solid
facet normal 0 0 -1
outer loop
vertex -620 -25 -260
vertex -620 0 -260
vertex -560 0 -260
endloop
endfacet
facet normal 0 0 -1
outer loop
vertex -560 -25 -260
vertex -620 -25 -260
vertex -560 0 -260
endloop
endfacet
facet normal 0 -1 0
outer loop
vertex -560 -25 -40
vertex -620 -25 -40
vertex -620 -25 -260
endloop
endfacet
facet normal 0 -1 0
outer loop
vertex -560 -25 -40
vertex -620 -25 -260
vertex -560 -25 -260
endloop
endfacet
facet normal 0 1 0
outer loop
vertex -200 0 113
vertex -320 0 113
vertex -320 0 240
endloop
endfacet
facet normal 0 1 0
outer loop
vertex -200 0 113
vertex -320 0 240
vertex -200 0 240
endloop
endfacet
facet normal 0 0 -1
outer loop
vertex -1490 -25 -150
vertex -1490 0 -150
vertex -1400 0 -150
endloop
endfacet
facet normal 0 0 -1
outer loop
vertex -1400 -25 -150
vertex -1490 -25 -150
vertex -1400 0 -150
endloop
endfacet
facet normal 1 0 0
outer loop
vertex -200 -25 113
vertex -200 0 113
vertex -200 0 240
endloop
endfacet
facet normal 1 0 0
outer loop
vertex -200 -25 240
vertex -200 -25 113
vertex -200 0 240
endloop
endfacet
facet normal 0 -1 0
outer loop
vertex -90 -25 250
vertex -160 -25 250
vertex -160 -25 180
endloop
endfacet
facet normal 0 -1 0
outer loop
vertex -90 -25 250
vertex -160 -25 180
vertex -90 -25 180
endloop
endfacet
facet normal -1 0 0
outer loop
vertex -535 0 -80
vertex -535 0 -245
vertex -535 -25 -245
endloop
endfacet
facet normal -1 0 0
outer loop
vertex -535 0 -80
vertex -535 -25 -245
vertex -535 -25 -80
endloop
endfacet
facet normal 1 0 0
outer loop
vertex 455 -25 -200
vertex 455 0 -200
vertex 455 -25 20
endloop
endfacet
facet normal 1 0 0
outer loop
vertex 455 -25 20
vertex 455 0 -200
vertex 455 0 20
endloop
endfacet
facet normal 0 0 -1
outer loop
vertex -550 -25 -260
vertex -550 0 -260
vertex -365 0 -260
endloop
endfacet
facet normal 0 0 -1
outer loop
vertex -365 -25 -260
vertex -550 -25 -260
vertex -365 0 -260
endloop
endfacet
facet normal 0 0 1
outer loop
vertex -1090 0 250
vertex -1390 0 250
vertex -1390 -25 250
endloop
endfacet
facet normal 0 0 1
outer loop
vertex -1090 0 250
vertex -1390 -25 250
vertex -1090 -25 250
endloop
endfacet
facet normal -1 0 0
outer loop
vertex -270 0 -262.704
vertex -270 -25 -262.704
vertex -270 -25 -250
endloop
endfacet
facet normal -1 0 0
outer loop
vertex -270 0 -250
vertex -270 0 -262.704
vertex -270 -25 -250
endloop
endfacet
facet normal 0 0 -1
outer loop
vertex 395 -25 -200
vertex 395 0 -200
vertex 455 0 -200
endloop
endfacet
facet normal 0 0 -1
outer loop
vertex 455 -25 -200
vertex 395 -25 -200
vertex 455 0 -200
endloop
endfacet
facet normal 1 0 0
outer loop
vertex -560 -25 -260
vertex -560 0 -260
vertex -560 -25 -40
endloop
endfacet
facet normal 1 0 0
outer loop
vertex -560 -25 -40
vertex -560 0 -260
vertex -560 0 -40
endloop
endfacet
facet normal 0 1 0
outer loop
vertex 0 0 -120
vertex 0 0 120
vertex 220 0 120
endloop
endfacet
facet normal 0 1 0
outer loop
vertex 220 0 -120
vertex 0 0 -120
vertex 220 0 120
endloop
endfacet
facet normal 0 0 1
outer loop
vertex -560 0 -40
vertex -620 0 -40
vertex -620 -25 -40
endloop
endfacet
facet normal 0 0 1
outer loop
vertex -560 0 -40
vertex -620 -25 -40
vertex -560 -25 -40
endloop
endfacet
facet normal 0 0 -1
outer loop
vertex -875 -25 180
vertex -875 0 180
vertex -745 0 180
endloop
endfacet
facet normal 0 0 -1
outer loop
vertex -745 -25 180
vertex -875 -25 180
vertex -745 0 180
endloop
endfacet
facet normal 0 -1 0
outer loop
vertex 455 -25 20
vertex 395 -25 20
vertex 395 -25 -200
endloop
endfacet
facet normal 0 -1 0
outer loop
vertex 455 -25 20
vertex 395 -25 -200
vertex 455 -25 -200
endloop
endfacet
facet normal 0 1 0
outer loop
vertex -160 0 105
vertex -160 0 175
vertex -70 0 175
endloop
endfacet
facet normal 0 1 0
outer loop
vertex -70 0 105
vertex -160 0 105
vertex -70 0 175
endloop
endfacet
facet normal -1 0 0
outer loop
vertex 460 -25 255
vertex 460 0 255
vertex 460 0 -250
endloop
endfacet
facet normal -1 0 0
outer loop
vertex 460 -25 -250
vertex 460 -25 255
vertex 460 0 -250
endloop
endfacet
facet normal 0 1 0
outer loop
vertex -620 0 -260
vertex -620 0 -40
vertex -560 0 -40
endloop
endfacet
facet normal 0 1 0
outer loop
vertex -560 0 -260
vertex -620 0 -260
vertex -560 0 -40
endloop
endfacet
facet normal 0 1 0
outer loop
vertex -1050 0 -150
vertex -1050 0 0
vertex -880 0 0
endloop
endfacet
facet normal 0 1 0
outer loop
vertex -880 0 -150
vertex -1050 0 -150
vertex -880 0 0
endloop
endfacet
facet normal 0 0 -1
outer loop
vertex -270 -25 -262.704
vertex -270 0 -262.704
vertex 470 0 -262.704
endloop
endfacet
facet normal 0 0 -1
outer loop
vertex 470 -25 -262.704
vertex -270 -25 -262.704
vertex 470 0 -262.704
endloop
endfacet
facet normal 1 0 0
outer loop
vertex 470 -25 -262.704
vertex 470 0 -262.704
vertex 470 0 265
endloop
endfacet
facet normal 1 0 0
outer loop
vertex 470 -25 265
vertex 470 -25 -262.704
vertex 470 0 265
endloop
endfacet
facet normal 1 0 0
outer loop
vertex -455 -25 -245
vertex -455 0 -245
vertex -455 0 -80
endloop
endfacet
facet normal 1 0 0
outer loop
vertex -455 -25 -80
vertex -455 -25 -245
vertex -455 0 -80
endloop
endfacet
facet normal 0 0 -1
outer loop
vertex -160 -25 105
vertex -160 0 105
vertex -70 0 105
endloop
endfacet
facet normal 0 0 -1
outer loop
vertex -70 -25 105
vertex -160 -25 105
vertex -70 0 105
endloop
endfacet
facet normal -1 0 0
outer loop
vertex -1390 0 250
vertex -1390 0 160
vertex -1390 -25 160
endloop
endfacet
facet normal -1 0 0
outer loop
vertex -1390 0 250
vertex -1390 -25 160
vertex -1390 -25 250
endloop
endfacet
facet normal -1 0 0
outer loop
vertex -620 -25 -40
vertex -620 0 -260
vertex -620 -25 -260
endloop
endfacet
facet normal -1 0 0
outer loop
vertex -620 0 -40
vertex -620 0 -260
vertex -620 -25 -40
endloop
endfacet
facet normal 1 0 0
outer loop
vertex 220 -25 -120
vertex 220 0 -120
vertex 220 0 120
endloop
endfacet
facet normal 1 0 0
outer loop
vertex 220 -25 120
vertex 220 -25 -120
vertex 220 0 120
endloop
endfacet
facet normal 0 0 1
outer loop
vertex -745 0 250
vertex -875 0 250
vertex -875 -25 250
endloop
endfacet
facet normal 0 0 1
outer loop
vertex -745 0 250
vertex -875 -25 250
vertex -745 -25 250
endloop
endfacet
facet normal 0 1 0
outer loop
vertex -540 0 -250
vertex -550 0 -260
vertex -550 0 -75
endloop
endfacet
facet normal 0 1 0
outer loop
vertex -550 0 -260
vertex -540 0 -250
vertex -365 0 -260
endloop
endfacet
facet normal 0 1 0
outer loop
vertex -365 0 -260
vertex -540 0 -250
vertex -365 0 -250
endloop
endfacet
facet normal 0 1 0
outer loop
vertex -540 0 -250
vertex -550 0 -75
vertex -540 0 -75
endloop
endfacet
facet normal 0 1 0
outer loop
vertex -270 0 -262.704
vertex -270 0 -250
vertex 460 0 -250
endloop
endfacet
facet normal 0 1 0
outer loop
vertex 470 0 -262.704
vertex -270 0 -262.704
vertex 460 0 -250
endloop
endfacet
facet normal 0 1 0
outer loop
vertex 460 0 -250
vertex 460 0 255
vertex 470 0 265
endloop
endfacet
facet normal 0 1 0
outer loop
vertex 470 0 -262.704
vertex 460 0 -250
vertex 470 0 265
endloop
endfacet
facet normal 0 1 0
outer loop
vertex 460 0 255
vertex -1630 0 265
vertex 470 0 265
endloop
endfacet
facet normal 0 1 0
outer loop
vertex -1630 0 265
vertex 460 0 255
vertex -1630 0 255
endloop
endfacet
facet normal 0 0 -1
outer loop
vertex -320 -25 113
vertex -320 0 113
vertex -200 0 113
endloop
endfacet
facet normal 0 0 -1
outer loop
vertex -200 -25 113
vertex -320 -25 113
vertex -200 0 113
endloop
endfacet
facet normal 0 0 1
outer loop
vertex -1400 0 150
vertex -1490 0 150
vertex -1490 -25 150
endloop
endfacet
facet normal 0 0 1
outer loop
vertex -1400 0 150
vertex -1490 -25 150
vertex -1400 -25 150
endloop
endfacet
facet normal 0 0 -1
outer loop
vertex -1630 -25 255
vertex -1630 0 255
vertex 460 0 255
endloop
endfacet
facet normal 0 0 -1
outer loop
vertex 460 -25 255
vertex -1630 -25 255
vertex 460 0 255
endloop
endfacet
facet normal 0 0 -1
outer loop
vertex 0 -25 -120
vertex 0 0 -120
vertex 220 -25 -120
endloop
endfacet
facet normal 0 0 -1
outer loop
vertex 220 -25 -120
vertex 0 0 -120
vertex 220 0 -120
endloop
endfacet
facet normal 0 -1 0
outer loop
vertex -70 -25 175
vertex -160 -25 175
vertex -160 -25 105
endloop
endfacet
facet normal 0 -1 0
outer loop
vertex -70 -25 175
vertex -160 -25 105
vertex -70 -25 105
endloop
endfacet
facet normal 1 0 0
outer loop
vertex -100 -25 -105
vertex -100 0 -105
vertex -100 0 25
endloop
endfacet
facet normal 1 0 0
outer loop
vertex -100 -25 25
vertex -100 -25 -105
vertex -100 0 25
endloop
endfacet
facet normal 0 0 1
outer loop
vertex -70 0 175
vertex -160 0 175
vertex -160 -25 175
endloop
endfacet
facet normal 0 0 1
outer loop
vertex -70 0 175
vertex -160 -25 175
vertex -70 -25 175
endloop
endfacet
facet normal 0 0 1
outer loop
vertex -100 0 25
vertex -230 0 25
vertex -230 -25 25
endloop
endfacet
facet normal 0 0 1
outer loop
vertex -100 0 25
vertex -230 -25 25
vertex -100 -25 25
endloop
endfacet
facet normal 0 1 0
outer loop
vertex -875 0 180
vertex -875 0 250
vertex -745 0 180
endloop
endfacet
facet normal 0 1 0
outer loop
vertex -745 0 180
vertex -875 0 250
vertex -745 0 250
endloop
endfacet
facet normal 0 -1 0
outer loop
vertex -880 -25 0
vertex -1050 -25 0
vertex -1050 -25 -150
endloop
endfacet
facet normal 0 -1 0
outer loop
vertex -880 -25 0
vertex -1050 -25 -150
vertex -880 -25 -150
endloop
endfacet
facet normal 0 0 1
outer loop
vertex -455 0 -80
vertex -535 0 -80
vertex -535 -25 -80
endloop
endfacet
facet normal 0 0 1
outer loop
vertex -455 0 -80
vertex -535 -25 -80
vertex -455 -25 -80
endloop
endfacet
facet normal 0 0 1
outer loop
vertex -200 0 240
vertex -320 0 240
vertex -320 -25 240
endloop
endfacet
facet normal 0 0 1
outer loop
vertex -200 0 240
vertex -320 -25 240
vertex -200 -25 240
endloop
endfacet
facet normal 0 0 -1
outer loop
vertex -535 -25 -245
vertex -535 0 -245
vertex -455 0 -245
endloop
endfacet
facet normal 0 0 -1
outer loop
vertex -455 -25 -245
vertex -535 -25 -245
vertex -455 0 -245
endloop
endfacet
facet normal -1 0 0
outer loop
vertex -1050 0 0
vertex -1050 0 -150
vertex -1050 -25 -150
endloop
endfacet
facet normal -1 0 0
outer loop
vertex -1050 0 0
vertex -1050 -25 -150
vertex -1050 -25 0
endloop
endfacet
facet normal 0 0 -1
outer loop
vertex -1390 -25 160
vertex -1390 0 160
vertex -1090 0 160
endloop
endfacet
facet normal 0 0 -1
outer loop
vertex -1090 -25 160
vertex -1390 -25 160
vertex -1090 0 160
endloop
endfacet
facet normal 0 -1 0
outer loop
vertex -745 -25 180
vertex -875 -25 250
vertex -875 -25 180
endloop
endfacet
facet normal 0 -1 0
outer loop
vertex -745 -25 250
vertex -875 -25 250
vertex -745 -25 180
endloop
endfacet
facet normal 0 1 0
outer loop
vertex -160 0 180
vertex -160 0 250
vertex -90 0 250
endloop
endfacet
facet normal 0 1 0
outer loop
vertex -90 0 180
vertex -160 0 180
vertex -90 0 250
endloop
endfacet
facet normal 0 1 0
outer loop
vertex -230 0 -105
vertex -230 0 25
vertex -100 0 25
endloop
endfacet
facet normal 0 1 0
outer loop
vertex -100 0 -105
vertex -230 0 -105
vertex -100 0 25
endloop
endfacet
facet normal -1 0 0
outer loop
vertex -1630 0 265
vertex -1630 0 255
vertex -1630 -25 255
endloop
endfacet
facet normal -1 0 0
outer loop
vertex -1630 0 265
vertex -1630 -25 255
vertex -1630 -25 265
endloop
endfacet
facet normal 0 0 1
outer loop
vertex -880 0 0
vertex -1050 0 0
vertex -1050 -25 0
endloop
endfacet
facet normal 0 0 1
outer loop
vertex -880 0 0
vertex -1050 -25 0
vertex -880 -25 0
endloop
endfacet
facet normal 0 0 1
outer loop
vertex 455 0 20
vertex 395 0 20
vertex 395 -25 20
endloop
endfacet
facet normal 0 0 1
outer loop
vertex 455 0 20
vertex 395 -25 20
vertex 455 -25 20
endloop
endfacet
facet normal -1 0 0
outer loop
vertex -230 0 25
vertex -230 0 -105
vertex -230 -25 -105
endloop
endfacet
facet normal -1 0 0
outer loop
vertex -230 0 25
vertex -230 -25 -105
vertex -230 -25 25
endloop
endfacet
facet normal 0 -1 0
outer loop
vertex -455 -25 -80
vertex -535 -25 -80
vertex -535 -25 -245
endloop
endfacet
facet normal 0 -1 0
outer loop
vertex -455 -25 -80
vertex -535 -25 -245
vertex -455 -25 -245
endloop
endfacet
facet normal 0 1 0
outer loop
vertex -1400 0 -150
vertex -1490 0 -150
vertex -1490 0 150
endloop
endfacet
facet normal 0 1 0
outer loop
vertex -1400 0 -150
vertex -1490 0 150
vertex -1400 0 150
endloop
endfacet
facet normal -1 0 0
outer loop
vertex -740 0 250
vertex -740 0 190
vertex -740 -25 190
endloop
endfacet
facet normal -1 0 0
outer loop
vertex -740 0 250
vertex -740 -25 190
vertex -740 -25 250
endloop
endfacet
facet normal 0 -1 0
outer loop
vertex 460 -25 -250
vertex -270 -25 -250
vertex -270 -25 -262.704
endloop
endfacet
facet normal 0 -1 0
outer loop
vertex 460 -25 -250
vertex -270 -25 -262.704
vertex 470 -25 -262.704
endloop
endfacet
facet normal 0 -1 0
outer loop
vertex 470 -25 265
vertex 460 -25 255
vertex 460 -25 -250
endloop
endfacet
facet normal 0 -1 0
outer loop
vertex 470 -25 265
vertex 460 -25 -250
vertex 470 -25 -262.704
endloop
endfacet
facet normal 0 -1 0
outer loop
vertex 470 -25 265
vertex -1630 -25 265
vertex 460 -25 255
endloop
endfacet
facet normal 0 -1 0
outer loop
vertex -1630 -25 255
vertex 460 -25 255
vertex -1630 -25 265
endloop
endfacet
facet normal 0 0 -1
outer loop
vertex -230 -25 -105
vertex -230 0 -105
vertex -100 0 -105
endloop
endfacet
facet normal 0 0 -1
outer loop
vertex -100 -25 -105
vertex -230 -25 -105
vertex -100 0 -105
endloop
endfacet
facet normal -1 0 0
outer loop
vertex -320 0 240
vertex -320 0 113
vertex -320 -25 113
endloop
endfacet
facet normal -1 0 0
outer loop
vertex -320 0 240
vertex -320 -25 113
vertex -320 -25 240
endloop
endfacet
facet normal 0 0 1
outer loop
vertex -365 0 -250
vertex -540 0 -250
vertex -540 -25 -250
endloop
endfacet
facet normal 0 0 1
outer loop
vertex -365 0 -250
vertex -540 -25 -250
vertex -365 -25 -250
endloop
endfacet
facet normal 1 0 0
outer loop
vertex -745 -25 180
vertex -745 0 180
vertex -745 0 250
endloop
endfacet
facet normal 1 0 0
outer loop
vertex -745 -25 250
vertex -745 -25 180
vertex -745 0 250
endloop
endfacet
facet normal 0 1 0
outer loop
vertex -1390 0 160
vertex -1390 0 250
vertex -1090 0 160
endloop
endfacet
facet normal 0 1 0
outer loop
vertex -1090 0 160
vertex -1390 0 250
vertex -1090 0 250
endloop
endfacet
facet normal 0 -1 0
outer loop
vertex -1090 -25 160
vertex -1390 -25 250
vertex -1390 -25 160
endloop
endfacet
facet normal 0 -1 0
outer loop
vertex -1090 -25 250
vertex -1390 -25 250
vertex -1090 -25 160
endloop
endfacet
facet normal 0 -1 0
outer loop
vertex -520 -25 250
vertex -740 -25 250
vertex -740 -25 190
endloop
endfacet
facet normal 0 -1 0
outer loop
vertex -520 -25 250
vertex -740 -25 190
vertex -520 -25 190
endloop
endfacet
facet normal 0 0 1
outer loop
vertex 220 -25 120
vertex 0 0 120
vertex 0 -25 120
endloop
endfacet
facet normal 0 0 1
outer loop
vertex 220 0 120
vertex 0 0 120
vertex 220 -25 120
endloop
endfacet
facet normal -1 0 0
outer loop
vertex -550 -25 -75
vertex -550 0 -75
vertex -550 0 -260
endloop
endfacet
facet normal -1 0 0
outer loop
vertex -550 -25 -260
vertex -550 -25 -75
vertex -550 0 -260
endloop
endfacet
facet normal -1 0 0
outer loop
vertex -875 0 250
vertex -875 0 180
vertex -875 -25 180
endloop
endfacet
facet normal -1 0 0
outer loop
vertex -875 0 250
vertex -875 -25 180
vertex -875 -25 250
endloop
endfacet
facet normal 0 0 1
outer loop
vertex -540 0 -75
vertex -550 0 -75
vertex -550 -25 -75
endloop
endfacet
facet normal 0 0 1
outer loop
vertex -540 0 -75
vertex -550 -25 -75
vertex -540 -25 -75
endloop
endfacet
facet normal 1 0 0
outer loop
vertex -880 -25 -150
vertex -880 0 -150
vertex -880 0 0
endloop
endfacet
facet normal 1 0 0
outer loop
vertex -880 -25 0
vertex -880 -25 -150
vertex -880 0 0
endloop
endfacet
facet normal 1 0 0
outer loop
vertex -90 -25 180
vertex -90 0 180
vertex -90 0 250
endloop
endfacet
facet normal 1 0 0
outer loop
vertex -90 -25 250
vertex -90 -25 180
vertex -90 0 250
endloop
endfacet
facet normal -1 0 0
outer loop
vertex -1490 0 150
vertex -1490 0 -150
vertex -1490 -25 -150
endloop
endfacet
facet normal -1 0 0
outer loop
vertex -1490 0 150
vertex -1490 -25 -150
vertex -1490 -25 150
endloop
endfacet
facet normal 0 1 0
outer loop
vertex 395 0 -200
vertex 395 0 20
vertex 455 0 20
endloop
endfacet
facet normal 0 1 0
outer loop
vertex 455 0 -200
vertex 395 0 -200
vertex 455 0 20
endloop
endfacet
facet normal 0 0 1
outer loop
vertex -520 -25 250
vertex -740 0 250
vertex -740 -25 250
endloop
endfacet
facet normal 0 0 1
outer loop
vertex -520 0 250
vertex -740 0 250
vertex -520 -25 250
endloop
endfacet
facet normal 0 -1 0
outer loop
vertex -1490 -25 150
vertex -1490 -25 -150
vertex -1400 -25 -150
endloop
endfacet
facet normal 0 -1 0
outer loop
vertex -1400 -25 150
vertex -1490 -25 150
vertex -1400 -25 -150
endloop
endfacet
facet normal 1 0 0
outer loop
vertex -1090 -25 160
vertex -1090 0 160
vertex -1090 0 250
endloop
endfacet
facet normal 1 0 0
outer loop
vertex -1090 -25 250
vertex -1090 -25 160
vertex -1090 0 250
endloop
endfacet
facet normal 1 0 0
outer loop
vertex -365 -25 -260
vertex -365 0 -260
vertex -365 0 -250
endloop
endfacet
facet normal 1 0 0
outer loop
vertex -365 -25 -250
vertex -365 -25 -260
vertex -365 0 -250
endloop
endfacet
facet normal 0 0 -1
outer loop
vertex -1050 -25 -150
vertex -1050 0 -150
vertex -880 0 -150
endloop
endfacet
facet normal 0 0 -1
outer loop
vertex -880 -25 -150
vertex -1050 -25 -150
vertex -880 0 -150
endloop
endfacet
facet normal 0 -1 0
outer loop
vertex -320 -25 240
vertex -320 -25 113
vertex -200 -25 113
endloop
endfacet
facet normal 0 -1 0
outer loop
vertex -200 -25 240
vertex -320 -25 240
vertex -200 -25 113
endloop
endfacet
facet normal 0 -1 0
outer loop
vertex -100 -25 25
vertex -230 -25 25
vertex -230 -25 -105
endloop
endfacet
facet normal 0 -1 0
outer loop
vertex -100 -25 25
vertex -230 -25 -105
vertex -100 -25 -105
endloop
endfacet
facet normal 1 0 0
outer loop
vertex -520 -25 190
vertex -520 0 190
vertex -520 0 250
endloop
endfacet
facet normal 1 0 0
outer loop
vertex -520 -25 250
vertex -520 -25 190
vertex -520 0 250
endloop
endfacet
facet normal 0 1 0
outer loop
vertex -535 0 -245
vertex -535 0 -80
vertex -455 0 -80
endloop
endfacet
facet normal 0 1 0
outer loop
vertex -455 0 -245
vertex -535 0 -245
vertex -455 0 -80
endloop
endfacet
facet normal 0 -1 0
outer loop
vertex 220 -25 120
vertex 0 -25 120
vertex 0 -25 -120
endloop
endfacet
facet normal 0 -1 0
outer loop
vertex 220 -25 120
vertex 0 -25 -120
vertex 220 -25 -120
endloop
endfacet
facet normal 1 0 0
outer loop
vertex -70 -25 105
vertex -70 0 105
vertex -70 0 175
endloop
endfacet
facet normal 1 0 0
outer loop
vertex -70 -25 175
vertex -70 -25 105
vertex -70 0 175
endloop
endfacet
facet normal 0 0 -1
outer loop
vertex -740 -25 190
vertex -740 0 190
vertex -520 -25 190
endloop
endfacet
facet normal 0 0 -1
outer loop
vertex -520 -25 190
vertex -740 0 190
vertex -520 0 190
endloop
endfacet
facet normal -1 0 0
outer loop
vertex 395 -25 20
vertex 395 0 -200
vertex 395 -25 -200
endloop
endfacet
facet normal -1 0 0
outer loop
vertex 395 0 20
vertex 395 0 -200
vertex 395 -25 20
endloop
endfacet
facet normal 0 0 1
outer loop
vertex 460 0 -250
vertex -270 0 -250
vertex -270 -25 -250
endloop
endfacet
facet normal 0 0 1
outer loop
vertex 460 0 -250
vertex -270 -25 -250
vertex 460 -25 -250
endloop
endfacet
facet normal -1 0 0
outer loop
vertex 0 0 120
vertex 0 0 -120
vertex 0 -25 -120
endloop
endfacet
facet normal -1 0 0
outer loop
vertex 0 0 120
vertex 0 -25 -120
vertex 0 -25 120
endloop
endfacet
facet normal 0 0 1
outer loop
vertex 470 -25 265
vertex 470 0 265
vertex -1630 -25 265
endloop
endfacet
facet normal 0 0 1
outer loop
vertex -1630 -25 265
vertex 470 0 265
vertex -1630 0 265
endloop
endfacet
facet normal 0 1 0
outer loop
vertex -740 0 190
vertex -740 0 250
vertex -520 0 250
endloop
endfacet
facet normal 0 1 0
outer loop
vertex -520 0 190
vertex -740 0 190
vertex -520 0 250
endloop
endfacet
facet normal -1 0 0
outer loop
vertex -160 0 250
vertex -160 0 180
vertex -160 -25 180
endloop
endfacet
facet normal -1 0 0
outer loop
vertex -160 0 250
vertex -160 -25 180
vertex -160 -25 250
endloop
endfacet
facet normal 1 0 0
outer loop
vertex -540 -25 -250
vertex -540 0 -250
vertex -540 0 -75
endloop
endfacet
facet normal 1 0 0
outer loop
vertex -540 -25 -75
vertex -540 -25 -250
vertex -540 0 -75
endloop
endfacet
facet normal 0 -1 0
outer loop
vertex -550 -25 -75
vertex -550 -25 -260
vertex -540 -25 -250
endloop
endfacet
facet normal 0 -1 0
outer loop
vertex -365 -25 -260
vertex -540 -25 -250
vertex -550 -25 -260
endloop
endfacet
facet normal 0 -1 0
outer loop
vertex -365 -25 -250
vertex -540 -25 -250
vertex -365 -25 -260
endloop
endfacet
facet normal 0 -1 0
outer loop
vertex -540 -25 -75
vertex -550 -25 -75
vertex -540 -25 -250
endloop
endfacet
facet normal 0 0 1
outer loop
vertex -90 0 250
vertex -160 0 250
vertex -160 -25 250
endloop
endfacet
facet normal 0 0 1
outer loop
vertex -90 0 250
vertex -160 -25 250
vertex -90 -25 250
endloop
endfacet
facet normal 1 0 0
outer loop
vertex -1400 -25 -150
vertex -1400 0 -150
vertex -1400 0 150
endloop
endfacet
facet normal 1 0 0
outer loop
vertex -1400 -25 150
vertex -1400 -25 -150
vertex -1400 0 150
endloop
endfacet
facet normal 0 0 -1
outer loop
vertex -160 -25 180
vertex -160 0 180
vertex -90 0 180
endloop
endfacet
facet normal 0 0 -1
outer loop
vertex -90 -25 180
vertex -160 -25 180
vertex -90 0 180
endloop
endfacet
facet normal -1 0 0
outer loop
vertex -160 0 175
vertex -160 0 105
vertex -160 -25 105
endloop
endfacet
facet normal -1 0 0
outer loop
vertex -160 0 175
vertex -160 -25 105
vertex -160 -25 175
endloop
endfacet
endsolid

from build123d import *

# Parameters (mm, degrees)
F0_W     = 220
F0_H     = 240
F0_W_2   = 10
F0_H_2   = 505
F0_H_3   = 10
F0_W_3   = 2090
F0_H_4   = 12.703896
F0_W_4   = 730
F0_W_5   = 130
F0_H_5   = 130
F0_W_6   = 120
F0_H_6   = 127
F0_W_7   = 90
F0_H_7   = 70
F0_W_8   = 70
F0_H_8   = 60
F0_H_9   = 175
F0_W_9   = 175
F0_W_10  = 60
F0_H_10  = 220
F0_W_11  = 170
F0_H_11  = 150
F0_W_12  = 300
F0_H_12  = 90
F0_H_13  = 300
F0_W_13  = 80
F0_H_14  = 165
F1_DEPTH = 25


with BuildPart() as f1:
    # F0 (on Front) → F1 (new body)
    with BuildSketch(Plane.XZ):
        with Locations((110, 0)):
            Rectangle(F0_W, F0_H)
        with Locations((465, 2.5)):
            Rectangle(F0_W_2, F0_H_2)
        with Locations((465, 260)):
            Rectangle(F0_W_2, F0_H_3)
        with Locations((-585, 260)):
            Rectangle(F0_W_3, F0_H_3)
        with Locations((465, -256.351948)):
            Rectangle(F0_W_2, F0_H_4)
        with Locations((95, -256.351948)):
            Rectangle(F0_W_4, F0_H_4)
        with Locations((-165, -40)):
            Rectangle(F0_W_5, F0_H_5)
        with Locations((-260, 176.5)):
            Rectangle(F0_W_6, F0_H_6)
        with Locations((-115, 140)):
            Rectangle(F0_W_7, F0_H_7)
        with Locations((-125, 215)):
            Rectangle(F0_W_8, F0_H_7)
        with Locations((-630, 220)):
            Rectangle(F0_W, F0_H_8)
        with Locations((-545, -162.5)):
            Rectangle(F0_W_2, F0_H_9)
        with Locations((-545, -255)):
            Rectangle(F0_W_2, F0_H_3)
        with Locations((-452.5, -255)):
            Rectangle(F0_W_9, F0_H_3)
        with Locations((-590, -150)):
            Rectangle(F0_W_10, F0_H_10)
        with Locations((-965, -75)):
            Rectangle(F0_W_11, F0_H_11)
        with Locations((-1240, 205)):
            Rectangle(F0_W_12, F0_H_12)
        with Locations((-1445, 0)):
            Rectangle(F0_W_7, F0_H_13)
        with Locations((-495, -162.5)):
            Rectangle(F0_W_13, F0_H_14)
        with Locations((-810, 215)):
            Rectangle(F0_W_5, F0_H_7)
        with Locations((425, -90)):
            Rectangle(F0_W_10, F0_H_10)
    extrude(amount=F1_DEPTH)


solid = f1.part
